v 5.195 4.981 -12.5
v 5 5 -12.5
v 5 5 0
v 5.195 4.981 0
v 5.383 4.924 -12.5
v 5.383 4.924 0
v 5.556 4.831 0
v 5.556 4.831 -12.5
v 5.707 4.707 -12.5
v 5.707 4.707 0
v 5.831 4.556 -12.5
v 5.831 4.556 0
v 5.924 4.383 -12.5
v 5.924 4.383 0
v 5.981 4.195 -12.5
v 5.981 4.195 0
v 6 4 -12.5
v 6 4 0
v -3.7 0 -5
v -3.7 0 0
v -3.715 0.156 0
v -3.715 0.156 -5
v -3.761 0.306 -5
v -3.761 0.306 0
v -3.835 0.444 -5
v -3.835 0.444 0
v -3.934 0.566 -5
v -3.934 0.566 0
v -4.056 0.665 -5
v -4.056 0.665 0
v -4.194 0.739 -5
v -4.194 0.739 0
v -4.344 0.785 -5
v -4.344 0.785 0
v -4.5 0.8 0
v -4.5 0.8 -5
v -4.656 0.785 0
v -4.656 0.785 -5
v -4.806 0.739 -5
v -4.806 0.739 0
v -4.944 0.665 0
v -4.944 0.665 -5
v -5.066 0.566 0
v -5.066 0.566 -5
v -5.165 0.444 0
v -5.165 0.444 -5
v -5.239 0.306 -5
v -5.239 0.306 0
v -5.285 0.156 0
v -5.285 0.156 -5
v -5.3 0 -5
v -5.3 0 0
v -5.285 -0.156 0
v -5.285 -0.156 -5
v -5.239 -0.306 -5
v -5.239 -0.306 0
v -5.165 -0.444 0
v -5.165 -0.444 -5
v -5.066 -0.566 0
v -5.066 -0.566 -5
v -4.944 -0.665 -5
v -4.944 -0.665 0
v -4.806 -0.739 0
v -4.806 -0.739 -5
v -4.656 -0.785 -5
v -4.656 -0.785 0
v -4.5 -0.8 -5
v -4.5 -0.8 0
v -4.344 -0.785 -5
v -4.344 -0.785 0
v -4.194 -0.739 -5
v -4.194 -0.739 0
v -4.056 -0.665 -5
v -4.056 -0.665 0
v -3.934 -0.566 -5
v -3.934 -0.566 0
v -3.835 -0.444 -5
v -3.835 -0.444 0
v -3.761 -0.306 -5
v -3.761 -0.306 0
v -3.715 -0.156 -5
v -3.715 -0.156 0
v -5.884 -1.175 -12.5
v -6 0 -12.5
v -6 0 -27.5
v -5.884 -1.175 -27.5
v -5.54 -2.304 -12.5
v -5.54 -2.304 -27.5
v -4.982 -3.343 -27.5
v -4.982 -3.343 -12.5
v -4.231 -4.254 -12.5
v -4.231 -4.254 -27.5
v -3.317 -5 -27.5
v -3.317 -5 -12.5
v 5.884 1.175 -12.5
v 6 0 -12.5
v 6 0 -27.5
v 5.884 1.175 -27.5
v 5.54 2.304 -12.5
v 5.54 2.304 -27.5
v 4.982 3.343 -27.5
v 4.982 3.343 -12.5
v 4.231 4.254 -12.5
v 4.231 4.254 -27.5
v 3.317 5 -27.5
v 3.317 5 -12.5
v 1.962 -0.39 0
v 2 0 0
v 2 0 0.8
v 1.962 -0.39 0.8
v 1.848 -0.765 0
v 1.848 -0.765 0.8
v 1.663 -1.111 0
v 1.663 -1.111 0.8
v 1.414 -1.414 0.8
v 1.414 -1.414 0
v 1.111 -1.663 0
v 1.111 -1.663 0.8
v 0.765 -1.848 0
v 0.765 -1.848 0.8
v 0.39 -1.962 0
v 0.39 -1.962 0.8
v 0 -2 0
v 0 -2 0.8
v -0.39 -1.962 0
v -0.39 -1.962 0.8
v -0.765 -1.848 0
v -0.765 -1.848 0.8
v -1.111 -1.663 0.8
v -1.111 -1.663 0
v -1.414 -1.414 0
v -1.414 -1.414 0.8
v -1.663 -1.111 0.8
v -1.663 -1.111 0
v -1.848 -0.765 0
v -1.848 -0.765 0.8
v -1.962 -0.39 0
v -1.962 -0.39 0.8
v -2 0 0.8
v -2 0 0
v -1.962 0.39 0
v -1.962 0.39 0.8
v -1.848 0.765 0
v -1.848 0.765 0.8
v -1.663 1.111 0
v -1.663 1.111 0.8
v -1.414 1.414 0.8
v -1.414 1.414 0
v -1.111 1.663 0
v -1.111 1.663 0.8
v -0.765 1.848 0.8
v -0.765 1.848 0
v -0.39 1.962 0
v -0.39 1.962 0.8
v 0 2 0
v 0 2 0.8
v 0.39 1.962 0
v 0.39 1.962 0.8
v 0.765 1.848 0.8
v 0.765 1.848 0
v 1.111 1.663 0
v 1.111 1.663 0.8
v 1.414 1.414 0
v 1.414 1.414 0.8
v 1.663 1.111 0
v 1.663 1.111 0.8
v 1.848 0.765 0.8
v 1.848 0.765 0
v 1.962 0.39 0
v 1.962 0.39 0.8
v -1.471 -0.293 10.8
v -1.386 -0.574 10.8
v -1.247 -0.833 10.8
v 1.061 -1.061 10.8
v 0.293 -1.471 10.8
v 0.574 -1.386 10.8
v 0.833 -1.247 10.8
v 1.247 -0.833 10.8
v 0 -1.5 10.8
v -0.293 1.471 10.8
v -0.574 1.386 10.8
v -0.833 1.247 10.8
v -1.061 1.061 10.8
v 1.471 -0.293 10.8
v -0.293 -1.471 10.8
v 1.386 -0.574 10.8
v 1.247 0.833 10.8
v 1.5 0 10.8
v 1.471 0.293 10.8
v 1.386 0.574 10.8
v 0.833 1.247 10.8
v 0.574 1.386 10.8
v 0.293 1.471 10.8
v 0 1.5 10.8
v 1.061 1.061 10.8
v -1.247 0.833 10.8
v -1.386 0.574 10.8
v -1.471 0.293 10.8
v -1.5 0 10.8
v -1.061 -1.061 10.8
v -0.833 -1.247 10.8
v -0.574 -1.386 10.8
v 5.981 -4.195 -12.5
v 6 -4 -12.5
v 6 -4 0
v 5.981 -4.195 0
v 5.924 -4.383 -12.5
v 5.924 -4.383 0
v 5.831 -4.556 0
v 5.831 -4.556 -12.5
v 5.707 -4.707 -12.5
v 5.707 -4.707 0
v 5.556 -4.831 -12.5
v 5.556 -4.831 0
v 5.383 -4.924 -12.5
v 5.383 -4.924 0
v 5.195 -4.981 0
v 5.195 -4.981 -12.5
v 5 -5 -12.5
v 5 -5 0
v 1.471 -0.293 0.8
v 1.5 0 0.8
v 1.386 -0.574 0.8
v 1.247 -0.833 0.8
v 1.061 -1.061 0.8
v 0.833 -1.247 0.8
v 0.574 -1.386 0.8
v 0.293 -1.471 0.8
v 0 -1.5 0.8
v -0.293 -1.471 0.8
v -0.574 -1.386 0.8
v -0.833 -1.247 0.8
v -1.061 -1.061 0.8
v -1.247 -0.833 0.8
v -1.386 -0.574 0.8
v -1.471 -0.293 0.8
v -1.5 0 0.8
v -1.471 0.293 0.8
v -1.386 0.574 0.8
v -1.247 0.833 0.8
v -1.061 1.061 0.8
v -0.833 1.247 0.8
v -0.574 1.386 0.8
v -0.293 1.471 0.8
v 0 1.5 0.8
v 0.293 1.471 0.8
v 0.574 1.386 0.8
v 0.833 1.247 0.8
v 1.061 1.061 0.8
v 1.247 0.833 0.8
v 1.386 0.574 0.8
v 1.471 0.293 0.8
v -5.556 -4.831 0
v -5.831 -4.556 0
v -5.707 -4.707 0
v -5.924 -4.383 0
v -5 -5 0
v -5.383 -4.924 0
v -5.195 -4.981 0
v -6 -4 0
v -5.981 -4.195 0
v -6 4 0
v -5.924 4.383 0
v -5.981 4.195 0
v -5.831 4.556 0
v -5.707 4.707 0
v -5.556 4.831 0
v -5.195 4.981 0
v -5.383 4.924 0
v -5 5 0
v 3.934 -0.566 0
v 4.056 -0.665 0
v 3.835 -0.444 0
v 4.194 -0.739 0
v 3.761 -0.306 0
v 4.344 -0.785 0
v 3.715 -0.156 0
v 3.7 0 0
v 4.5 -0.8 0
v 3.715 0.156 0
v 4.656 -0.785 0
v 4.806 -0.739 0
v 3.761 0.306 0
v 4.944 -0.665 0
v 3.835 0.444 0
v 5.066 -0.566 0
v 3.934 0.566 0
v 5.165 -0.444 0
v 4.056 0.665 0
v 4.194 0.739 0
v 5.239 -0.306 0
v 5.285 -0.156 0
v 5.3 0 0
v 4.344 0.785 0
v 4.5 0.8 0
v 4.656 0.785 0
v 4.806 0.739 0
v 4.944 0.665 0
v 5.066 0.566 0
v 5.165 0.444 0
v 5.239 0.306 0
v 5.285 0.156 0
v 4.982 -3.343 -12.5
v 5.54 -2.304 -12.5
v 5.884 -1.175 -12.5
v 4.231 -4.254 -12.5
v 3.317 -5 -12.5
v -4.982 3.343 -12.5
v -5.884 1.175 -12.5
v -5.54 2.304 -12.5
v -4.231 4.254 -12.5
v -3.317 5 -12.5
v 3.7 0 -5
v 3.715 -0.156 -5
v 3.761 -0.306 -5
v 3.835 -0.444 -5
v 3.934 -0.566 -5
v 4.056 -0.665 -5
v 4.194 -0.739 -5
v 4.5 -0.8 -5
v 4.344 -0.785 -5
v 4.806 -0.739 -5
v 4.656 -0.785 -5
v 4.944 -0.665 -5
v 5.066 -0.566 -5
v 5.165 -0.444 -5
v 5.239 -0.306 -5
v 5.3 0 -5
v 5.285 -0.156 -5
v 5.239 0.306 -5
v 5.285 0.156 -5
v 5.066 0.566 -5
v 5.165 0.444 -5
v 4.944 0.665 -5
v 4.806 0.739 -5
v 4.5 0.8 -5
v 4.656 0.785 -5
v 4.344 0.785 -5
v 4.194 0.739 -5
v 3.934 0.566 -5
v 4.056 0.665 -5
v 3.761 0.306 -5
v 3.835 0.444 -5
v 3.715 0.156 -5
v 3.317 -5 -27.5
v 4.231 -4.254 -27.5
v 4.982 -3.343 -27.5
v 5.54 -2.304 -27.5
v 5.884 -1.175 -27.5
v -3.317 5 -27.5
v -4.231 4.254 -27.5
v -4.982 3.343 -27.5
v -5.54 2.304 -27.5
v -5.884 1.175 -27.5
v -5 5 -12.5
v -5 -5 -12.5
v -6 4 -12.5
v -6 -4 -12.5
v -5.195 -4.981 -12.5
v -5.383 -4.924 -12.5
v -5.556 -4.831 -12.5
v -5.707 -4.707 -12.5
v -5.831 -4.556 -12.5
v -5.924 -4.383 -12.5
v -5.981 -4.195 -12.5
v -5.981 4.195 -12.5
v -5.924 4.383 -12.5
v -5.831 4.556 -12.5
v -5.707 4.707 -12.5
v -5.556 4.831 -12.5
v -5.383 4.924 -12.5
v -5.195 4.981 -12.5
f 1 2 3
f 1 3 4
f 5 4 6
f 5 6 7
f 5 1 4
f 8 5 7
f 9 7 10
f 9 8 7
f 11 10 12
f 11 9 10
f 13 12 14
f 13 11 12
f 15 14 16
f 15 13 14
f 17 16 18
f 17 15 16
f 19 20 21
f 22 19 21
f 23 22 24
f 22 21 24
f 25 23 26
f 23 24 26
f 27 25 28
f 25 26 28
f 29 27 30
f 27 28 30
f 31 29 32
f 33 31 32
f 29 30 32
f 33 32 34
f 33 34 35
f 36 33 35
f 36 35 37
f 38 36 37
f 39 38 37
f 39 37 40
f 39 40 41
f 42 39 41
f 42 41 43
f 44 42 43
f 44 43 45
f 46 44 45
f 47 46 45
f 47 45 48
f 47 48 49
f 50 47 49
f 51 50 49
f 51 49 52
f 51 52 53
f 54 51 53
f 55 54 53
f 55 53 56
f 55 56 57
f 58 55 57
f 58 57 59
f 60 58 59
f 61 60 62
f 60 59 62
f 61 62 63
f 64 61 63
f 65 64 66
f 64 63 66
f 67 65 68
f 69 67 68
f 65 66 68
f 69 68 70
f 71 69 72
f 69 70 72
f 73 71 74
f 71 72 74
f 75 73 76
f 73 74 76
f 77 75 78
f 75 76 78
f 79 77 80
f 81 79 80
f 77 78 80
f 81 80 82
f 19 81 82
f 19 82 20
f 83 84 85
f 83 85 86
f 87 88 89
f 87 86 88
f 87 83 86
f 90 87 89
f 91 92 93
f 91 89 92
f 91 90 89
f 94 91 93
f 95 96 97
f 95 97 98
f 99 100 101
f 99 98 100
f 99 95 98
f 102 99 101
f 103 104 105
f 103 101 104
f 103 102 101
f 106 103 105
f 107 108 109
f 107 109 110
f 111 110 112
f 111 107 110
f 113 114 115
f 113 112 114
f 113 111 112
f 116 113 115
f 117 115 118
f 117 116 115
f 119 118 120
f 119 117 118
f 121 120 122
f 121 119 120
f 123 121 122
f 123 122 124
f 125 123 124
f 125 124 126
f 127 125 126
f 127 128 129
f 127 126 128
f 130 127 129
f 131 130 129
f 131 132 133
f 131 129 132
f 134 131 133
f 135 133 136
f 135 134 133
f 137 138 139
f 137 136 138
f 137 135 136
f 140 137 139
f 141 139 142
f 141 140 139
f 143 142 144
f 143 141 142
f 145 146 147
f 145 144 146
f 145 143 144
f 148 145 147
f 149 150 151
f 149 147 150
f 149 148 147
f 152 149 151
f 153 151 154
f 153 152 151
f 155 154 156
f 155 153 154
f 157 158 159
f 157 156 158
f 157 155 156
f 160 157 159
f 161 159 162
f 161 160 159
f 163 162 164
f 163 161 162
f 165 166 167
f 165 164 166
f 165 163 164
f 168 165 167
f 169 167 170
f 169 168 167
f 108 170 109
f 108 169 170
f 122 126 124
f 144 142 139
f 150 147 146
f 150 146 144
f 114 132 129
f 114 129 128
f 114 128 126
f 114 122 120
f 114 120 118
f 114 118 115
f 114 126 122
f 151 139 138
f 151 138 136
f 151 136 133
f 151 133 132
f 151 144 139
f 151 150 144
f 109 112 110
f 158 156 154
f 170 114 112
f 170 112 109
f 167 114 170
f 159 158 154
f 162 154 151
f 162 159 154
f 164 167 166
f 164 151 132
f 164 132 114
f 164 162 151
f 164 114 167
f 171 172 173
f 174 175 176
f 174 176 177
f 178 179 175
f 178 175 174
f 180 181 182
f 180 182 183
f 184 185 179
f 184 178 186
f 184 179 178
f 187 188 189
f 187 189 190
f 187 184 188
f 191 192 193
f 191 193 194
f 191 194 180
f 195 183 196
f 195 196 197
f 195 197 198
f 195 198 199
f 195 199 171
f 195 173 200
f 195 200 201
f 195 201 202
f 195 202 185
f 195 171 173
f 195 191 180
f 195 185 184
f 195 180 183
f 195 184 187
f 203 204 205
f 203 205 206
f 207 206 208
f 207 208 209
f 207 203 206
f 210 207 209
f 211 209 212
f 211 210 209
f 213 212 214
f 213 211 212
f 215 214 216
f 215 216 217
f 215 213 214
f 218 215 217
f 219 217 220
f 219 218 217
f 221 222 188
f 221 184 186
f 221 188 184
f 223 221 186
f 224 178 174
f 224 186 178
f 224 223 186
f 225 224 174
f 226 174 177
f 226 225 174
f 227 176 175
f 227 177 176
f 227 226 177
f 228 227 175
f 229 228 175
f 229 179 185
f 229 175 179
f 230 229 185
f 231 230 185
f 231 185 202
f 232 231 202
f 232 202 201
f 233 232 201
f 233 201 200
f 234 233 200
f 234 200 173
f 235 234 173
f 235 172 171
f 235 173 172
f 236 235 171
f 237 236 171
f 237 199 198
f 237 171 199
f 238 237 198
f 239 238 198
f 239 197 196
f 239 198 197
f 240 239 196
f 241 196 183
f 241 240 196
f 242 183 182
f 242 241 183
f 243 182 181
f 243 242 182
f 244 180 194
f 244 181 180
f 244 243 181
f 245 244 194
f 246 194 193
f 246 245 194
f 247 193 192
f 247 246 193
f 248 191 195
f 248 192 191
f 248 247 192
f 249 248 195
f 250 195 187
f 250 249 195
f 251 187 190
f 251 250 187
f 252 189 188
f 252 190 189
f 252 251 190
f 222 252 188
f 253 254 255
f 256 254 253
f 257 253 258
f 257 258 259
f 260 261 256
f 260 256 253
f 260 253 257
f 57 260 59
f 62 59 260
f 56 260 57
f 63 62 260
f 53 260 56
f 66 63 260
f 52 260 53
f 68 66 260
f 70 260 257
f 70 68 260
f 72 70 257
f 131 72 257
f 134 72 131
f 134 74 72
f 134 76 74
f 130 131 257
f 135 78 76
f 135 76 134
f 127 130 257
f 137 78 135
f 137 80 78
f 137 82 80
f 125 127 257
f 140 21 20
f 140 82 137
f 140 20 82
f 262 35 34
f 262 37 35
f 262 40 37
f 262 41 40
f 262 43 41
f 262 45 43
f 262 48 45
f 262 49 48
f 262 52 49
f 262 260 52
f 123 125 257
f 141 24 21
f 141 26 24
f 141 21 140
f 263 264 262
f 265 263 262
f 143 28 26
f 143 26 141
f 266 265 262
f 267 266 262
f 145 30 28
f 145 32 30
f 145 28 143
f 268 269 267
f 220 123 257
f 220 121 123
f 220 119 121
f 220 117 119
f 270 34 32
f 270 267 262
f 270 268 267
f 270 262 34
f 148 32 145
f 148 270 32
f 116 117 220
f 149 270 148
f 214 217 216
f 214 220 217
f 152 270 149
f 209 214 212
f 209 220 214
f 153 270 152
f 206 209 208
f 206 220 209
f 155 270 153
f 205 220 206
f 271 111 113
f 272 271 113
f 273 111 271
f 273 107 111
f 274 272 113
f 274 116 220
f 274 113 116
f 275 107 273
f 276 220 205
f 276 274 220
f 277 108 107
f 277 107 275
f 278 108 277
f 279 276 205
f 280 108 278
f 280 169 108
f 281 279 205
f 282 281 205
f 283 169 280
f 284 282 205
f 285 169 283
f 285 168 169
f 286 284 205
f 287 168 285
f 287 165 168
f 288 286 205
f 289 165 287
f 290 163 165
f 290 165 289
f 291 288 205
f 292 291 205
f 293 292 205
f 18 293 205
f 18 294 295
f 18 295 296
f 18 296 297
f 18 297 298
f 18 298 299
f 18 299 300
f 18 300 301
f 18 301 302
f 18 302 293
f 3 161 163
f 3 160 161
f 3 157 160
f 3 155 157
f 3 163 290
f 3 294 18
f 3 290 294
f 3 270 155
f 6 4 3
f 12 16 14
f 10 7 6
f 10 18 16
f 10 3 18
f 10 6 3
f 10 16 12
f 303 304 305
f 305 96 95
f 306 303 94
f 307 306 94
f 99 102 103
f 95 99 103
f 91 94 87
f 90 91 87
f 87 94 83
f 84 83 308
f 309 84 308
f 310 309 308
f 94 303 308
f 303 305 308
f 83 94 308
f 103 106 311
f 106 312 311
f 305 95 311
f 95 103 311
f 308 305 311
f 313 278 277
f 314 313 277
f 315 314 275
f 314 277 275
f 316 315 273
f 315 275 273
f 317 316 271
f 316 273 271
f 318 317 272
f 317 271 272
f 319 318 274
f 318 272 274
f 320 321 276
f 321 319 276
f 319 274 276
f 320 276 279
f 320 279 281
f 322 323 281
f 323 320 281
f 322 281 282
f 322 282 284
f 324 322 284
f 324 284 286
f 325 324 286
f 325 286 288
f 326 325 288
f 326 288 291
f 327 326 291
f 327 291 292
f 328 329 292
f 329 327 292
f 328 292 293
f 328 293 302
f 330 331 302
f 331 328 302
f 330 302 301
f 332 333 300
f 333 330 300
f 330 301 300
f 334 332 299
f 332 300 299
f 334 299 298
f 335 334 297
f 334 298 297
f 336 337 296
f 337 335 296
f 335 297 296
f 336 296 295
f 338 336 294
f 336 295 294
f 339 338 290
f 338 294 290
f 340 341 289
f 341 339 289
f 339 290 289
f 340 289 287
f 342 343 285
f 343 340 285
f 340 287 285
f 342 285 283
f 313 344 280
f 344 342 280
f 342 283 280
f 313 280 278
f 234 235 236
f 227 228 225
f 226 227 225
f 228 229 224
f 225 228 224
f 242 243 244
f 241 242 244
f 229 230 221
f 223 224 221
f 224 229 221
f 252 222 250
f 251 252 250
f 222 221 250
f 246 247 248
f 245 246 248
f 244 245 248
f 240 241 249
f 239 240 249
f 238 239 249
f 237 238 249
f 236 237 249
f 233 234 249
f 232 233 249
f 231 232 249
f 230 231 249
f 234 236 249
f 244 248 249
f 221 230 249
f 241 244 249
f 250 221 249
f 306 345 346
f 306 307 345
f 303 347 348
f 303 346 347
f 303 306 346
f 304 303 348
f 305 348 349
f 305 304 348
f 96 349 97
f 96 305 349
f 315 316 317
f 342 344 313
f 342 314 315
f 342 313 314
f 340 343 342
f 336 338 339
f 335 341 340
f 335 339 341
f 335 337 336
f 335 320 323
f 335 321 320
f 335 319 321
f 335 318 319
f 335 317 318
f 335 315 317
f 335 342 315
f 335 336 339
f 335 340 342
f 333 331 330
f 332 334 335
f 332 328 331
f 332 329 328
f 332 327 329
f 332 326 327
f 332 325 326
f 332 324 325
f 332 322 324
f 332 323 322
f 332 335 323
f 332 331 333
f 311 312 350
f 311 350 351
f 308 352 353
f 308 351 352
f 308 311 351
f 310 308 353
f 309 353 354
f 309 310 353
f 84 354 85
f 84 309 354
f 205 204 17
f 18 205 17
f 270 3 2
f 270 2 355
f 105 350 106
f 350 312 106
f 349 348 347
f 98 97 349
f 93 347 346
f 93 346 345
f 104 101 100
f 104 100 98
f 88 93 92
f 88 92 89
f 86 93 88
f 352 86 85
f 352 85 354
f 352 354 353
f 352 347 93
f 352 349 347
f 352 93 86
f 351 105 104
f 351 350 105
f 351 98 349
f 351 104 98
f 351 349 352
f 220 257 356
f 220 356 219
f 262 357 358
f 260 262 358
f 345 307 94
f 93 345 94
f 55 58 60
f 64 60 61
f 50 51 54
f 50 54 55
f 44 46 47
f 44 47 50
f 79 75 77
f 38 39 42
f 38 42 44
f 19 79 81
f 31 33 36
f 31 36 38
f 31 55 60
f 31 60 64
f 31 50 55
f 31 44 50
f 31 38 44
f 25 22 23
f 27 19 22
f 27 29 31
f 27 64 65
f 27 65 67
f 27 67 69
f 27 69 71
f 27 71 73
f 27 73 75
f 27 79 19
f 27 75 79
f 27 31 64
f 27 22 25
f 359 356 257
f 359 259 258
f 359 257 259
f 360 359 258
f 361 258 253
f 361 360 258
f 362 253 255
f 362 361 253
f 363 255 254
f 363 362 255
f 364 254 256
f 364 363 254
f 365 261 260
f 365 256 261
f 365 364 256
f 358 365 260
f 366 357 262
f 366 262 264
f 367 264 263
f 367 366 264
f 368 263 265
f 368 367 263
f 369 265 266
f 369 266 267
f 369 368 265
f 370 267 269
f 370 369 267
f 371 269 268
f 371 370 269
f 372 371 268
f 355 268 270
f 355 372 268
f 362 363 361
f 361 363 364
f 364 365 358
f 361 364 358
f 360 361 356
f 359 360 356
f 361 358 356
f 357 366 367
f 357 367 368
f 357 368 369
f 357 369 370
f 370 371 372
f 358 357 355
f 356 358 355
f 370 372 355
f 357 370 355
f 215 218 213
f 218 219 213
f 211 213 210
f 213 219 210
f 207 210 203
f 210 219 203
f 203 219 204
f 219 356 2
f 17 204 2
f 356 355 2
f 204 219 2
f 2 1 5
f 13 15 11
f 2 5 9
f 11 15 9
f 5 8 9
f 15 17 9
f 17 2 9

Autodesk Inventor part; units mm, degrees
ref_plane "YZ Plane" through (0, 0, 0) normal (1, 0, 0) x (0, 1, 0)
ref_plane "XZ Plane" through (0, 0, 0) normal (0, 1, 0) x (-1, 0, 0)
ref_plane "XY Plane" through (0, 0, 0) normal (0, 0, 1) x (1, 0, 0)
sketch "Skizze1" plane through (0, 0, 0) normal (0, 0, 1) x (1, 0, 0)
  line L0 (-6, -5) -> (6, -5)
  line L1 (6, -5) -> (6, 5)
  line L2 (6, 5) -> (-6, 5)
  line L3 (-6, 5) -> (-6, -5)
  line L4 (-6, -5) -> (6, 5) construction
  line L5 (6, -5) -> (-6, 5) construction
  point P0 (0, 0)
  dimension "d0" = 12
  dimension "d1" = 10
extrude "Extrusion1" add sketch "Skizze1" against normal blind 12.5
sketch "Skizze2" plane through (0, 0, -12.5) normal (0, 0, -1) x (-1, 0, 0)
  line L0 (6, -5) -> (6, 5) projected
  line L1 (-3.3166, -5) -> (3.3166, -5)
  line L2 (3.3166, 5) -> (-3.3166, 5)
  line L3 (-6, -5) -> (6, 5) construction
  line L4 (6, -5) -> (-6, 5) construction
  arc A0 (3.3166, -5) -> (3.3166, 5) centre (0, 0) ccw
  arc A1 (-3.3166, 5) -> (-3.3166, -5) centre (0, 0) ccw
  line L5 (-6, 5) -> (-6, -5) projected
  line L6 (-6, -5) -> (6, -5) projected
  line L7 (6, 5) -> (-6, 5) projected
extrude "Extrusion2" add sketch "Skizze2" along normal blind 15 separate body contours A0 L1 A1 L2
fillet "Rundung1" radius 1 4 edges at (6, 5, -6.25) (-6, 5, -6.25) (-6, -5, -6.25) (6, -5, -6.25)
sketch "Skizze3" plane through (0, 0, 0) normal (0, 0, 1) x (1, 0, 0)
  circle A0 centre (0, 0) radius 2
  dimension "d7" = 4
extrude "Extrusion3" add sketch "Skizze3" along normal blind 0.8 bodies 1
sketch "Skizze4" plane through (0, 0, 0.8) normal (0, 0, 1) x (1, 0, 0)
  circle A0 centre (0, 0) radius 2 projected
  circle A1 centre (0, 0) radius 1.5
  dimension "d10" = 3
extrude "Extrusion4" add sketch "Skizze4" along normal blind 10 separate body contours A1
sketch "Skizze5" plane through (0, 0, 0) normal (0, 0, 1) x (1, 0, 0)
  line L0 (6, -4) -> (6, 4) projected
  circle A0 centre (-4.5, 0) radius 0.8
  line L1 (-4.5, 0) -> (0, 0) construction
  dimension "d15" = 1.6
  dimension "d16" = 4.5
extrude "Extrusion5" cut sketch "Skizze5" against normal blind 5 bodies 1
mirror "Spiegeln1" about plane through (0, 0, 0) normal (1, 0, 0) of "Extrusion5" bodies 1
ref_plane "Arbeitsebene1" through (0, 0, 0) normal (1, 0, 0) x (0, 1, 0)
properties part number "P_Gewindemotor_N20"
